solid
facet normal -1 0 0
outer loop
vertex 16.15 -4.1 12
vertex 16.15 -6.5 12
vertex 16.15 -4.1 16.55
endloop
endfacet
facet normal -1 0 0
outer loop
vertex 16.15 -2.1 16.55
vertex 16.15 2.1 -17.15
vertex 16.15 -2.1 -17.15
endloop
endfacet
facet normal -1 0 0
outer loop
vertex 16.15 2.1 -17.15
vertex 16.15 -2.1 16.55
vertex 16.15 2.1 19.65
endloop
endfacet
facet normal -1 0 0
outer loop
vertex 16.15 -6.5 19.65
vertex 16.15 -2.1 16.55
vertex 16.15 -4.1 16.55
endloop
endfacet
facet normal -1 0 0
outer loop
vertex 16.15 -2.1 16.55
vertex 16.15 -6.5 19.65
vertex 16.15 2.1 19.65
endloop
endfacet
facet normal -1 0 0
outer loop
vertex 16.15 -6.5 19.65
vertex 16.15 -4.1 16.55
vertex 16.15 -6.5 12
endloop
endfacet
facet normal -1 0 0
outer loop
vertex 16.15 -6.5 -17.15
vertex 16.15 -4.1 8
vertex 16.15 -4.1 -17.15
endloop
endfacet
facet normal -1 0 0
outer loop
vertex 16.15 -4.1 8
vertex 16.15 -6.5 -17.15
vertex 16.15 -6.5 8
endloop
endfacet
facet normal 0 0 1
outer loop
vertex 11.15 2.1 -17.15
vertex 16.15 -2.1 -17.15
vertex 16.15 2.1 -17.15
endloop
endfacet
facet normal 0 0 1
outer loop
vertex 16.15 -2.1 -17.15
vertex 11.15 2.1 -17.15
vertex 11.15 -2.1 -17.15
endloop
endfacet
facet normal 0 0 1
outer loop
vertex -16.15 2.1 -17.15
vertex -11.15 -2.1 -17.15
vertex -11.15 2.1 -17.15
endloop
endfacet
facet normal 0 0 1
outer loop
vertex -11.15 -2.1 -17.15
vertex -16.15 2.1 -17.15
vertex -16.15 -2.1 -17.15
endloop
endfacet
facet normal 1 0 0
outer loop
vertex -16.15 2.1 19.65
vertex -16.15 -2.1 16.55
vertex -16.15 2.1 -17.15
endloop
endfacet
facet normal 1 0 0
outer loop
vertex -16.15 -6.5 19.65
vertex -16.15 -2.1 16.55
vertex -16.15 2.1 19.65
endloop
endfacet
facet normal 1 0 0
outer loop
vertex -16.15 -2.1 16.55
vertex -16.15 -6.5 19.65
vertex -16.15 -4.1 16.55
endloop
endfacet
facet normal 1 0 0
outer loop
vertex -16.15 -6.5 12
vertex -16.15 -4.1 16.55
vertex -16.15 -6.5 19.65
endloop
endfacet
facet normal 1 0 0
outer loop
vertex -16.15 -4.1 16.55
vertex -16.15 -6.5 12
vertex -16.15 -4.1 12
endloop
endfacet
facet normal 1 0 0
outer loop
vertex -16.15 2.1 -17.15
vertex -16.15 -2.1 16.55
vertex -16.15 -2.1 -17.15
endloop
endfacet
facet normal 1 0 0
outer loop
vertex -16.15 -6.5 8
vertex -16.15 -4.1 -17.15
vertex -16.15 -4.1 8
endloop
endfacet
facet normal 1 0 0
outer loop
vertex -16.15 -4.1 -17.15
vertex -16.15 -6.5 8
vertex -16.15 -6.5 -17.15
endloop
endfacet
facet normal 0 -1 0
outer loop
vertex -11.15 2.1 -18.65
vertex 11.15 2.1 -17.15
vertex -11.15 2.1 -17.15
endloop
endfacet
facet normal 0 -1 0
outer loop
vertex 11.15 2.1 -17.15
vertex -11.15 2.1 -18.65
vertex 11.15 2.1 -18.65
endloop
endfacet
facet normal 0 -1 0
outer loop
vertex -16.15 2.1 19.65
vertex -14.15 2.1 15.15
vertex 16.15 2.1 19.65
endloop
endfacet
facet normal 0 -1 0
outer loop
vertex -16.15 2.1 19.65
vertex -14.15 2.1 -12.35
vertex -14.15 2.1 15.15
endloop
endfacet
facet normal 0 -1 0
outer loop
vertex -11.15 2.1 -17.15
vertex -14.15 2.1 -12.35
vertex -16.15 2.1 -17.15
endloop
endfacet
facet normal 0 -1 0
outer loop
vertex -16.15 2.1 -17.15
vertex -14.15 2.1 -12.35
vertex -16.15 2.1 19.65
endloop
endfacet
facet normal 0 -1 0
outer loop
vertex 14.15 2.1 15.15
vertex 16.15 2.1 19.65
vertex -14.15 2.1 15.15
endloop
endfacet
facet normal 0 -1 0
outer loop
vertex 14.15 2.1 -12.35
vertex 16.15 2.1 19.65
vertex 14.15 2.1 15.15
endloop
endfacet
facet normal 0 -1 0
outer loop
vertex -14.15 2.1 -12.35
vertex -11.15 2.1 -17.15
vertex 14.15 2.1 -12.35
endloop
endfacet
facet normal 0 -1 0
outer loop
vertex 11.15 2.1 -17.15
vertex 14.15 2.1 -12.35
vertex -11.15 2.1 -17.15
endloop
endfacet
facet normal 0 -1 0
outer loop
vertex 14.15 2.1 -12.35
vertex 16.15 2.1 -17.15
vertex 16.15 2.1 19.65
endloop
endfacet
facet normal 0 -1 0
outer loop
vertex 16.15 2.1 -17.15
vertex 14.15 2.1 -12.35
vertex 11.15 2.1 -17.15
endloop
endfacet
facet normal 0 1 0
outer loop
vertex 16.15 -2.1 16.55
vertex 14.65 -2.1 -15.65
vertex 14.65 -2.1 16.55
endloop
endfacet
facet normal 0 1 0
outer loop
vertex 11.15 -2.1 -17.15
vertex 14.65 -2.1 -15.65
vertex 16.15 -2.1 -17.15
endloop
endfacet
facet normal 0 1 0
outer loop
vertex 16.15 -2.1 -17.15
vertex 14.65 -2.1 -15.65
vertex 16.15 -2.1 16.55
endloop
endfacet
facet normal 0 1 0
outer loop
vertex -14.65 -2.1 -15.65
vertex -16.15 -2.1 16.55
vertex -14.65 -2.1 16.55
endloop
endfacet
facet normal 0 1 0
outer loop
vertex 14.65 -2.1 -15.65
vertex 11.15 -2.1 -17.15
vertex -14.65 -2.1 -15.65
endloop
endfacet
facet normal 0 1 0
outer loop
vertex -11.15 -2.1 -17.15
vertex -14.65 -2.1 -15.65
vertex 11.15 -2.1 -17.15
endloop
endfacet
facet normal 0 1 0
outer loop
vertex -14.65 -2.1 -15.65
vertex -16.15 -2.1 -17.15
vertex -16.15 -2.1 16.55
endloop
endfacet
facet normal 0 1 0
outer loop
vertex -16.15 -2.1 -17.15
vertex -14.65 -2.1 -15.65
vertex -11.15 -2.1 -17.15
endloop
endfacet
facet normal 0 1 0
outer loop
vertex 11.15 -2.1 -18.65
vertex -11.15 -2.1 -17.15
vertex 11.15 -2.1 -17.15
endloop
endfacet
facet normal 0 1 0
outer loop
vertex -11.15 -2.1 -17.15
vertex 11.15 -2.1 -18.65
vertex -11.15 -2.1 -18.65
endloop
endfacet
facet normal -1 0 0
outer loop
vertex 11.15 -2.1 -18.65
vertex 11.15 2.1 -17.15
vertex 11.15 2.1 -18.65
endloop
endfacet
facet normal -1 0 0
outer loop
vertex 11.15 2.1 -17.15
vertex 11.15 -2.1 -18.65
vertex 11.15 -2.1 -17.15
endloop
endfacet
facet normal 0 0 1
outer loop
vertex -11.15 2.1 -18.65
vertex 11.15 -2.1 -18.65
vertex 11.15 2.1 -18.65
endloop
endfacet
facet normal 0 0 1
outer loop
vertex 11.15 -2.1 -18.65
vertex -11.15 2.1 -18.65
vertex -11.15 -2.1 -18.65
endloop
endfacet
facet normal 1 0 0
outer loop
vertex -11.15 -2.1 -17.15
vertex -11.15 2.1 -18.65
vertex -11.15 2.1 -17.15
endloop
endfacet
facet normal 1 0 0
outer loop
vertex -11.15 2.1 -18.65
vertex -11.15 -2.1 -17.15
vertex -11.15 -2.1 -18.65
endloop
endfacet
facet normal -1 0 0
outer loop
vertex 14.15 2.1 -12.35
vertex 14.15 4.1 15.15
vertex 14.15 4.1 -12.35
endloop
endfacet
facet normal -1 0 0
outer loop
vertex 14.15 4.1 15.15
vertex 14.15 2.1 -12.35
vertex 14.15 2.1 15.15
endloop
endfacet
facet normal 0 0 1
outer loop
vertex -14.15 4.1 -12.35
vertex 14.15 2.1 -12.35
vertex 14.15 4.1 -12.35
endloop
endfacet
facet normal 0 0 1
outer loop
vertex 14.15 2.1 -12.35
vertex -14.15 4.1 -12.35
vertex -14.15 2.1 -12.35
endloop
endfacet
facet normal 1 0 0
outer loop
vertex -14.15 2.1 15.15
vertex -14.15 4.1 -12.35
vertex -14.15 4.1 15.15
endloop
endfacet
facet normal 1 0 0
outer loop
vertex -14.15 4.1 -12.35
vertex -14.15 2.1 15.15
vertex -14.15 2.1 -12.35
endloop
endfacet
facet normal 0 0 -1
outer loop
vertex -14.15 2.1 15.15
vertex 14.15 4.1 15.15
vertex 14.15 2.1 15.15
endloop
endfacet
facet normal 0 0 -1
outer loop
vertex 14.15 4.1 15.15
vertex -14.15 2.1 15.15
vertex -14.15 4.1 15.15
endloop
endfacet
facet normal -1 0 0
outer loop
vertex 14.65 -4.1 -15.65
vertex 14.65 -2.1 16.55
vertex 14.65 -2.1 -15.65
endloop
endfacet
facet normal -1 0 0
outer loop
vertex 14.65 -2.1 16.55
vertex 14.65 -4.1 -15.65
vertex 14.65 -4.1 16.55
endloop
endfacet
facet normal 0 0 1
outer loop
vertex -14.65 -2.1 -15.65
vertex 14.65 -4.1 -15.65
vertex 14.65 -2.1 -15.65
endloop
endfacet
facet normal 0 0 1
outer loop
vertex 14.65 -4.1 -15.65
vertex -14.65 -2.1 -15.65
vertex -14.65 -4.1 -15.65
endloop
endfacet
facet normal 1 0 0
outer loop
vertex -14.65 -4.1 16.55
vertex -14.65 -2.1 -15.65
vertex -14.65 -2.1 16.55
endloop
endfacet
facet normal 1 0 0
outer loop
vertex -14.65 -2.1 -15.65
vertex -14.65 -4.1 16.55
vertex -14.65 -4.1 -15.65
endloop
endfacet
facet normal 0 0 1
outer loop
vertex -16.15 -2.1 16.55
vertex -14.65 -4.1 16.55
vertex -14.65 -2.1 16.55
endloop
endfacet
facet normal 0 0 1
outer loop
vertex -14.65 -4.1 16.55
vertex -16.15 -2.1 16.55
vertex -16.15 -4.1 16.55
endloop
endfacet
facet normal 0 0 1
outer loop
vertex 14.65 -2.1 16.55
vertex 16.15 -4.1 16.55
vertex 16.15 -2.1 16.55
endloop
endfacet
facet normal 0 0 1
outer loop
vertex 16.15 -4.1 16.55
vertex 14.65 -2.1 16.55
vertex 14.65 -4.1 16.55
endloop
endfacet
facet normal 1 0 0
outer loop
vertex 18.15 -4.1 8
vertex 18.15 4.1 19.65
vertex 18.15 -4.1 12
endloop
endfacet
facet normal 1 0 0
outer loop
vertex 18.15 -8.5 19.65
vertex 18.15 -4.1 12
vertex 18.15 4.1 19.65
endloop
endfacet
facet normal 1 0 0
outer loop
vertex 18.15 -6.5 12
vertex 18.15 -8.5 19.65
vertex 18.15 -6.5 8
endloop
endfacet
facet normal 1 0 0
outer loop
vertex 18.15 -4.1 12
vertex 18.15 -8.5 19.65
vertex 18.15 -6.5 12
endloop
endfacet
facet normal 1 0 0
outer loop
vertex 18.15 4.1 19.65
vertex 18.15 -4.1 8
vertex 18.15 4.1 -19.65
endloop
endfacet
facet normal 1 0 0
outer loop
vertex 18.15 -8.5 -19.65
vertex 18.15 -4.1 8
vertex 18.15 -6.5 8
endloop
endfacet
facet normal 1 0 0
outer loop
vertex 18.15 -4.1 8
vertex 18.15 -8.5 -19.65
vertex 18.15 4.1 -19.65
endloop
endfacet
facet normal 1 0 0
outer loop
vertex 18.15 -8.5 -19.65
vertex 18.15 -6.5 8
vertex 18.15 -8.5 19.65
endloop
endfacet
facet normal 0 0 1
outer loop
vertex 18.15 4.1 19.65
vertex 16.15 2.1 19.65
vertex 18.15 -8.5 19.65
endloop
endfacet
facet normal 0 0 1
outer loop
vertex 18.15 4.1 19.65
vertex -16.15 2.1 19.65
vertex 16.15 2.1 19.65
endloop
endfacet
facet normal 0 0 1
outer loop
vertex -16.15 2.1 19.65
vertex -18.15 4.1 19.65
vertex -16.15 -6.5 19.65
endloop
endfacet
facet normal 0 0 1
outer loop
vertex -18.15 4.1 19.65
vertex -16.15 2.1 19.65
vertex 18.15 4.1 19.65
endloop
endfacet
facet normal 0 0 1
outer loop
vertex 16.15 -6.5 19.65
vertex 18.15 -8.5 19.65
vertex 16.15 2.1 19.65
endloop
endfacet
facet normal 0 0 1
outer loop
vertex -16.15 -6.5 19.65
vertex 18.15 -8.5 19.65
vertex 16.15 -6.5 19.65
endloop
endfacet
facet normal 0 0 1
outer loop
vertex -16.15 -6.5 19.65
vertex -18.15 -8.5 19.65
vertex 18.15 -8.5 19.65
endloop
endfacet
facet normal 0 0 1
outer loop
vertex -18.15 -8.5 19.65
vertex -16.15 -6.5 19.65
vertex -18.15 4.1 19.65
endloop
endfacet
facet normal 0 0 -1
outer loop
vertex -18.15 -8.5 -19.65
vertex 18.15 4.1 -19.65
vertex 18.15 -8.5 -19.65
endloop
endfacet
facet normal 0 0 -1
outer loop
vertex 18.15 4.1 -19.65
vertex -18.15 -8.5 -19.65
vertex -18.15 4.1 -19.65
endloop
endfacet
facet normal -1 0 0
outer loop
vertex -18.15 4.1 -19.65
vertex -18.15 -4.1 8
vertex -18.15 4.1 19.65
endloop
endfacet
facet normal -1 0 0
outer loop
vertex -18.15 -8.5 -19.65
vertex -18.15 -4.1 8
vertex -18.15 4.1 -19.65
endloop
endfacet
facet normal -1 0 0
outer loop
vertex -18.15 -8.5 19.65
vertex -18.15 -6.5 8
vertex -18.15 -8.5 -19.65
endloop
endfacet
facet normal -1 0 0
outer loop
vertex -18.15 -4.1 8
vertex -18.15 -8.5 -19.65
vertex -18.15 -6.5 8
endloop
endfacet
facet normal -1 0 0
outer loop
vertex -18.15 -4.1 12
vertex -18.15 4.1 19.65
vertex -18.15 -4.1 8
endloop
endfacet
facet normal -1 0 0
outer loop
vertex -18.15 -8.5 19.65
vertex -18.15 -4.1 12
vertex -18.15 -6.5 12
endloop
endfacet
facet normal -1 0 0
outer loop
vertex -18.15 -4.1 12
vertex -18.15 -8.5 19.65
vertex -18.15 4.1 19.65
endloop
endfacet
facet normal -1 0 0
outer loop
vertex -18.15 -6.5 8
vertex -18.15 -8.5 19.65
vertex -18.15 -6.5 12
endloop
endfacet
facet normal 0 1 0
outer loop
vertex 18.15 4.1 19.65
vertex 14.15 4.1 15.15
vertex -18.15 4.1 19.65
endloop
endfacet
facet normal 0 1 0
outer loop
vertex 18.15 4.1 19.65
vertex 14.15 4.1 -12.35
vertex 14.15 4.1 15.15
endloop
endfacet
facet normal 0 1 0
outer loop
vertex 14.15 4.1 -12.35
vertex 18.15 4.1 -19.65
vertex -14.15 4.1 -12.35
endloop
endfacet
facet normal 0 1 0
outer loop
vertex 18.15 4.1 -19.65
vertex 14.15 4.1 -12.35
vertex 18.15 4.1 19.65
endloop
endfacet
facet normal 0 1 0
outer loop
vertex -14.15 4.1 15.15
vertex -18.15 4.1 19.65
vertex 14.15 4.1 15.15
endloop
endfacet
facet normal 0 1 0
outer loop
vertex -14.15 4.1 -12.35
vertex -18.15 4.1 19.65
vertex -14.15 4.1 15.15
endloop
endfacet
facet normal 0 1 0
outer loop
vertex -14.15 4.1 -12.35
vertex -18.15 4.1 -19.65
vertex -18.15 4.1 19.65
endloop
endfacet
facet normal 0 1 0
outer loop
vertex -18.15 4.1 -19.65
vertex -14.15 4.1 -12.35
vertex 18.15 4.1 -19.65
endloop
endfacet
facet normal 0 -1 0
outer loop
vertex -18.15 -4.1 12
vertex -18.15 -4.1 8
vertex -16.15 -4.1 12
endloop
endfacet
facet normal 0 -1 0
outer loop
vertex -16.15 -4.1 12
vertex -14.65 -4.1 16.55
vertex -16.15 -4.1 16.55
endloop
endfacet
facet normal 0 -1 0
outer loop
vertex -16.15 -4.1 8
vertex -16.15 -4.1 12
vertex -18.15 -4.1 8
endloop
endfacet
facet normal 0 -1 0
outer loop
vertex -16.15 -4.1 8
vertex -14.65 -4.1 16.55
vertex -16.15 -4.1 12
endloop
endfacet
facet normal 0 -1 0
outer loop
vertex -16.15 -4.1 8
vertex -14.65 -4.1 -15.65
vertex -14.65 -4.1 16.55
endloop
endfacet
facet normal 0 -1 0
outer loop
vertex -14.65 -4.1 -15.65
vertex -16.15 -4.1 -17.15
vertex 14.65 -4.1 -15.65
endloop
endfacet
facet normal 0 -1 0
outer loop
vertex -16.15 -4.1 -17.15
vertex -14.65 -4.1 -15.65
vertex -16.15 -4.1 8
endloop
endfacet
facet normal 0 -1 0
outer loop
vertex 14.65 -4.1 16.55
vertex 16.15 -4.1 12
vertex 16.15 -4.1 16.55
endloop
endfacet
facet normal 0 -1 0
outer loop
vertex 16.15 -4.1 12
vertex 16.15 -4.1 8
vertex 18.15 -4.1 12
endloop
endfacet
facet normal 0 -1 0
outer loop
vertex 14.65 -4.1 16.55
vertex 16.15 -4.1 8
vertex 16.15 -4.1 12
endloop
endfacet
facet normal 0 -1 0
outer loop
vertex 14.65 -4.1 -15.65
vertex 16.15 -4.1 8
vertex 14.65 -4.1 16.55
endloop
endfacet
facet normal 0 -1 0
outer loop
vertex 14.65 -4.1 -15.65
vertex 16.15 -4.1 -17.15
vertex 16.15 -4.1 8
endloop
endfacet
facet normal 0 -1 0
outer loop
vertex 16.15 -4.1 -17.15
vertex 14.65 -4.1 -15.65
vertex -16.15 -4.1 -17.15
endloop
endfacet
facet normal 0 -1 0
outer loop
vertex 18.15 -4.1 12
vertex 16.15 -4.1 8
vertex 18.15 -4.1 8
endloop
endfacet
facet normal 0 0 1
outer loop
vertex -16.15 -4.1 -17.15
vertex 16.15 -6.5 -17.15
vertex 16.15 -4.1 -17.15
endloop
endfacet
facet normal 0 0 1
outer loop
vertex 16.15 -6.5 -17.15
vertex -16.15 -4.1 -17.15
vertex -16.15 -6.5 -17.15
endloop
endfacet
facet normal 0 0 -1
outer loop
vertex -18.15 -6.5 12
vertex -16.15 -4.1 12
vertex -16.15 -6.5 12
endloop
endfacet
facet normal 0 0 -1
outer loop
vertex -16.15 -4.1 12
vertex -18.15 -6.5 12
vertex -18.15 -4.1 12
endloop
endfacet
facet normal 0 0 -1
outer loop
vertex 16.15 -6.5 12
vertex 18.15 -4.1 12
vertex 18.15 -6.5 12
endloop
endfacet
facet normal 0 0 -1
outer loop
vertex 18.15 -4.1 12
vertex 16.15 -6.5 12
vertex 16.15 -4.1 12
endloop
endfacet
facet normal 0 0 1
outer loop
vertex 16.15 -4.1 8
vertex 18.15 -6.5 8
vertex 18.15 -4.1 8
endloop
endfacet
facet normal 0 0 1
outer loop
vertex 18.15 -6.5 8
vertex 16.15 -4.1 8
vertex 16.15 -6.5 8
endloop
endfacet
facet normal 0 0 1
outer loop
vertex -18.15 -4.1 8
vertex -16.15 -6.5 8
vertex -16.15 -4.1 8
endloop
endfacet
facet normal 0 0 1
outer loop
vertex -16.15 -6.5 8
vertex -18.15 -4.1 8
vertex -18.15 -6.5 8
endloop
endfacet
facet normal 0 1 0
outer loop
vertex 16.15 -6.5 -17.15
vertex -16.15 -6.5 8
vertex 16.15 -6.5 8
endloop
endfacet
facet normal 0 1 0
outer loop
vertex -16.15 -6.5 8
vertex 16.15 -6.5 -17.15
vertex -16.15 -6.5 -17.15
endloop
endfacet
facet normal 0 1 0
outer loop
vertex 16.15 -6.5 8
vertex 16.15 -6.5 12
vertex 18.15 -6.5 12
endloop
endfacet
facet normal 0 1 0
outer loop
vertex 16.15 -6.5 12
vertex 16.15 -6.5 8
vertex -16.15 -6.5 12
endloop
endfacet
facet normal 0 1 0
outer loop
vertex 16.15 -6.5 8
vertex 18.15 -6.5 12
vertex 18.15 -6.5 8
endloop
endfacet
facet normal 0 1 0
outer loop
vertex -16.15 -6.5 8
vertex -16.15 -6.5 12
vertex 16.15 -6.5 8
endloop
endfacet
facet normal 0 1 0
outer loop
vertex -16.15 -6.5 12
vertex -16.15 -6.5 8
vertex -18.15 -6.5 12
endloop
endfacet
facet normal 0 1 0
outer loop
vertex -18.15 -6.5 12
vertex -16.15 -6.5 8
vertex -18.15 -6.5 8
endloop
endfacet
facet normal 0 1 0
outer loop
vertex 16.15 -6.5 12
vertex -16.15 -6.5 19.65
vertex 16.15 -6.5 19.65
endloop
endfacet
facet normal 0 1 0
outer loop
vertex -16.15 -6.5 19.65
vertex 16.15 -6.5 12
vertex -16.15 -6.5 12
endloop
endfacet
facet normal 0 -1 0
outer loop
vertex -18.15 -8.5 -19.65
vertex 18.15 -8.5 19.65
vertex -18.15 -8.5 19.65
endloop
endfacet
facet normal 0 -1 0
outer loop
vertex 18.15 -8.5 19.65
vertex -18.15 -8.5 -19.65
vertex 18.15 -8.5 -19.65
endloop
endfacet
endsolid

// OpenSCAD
//长宽高
ma=32.3;//横着
mb=34.3;//竖着
mc=4.2;//厚度

l1=1.6;//屏幕顶部
l2=2;//两边
l3=4.8;//屏幕底部

ll=3;//默认槽宽


difference()
{
    cube([ma+4,mc+4,mb+5],true);
    union()
    {
        cube([ma,mc,mb],true);//中间的空间
        translate([0,0,-1.5])//屏幕排线
            cube([ma-10,mc,mb],true);
        
        translate([0,3,0])//前面扣洞
            cube([ma-l2*2,mc,mb-l3*2],true);
        translate([0,3,mb/4])//前面再扣洞
            cube([ma-l2*2,mc,mb/2-l2*2],true);
        translate([0,-3,0])//背面扣洞
            cube([ma-ll,mc,mb-ll],true);
        
        translate([0,0,5])//上面扣洞
            cube([ma,mc,mb],true);
        translate([0,-3,10])//去掉一个梁
            cube([ma-ll,mc,mb-ll],true);

        translate([0,-3,mb/2+1])//做个槽放盖子
            cube([ma,mc,3.2],true);
    }
}
translate([0,-7.5,0])//背面
    cube([ma+4,2,mb+5],true);

difference()
{
    translate([0,-5,0])//背面
        cube([ma+4,3,mb+5],true);
    translate([0,-5,0])//背面
    union()
    {
        translate([0,0,5])//上面扣洞
            cube([ma,mc,mb+10],true);
        translate([0,0,10])//卡扣
            cube([ma+5,4,4],true);
    }
}
